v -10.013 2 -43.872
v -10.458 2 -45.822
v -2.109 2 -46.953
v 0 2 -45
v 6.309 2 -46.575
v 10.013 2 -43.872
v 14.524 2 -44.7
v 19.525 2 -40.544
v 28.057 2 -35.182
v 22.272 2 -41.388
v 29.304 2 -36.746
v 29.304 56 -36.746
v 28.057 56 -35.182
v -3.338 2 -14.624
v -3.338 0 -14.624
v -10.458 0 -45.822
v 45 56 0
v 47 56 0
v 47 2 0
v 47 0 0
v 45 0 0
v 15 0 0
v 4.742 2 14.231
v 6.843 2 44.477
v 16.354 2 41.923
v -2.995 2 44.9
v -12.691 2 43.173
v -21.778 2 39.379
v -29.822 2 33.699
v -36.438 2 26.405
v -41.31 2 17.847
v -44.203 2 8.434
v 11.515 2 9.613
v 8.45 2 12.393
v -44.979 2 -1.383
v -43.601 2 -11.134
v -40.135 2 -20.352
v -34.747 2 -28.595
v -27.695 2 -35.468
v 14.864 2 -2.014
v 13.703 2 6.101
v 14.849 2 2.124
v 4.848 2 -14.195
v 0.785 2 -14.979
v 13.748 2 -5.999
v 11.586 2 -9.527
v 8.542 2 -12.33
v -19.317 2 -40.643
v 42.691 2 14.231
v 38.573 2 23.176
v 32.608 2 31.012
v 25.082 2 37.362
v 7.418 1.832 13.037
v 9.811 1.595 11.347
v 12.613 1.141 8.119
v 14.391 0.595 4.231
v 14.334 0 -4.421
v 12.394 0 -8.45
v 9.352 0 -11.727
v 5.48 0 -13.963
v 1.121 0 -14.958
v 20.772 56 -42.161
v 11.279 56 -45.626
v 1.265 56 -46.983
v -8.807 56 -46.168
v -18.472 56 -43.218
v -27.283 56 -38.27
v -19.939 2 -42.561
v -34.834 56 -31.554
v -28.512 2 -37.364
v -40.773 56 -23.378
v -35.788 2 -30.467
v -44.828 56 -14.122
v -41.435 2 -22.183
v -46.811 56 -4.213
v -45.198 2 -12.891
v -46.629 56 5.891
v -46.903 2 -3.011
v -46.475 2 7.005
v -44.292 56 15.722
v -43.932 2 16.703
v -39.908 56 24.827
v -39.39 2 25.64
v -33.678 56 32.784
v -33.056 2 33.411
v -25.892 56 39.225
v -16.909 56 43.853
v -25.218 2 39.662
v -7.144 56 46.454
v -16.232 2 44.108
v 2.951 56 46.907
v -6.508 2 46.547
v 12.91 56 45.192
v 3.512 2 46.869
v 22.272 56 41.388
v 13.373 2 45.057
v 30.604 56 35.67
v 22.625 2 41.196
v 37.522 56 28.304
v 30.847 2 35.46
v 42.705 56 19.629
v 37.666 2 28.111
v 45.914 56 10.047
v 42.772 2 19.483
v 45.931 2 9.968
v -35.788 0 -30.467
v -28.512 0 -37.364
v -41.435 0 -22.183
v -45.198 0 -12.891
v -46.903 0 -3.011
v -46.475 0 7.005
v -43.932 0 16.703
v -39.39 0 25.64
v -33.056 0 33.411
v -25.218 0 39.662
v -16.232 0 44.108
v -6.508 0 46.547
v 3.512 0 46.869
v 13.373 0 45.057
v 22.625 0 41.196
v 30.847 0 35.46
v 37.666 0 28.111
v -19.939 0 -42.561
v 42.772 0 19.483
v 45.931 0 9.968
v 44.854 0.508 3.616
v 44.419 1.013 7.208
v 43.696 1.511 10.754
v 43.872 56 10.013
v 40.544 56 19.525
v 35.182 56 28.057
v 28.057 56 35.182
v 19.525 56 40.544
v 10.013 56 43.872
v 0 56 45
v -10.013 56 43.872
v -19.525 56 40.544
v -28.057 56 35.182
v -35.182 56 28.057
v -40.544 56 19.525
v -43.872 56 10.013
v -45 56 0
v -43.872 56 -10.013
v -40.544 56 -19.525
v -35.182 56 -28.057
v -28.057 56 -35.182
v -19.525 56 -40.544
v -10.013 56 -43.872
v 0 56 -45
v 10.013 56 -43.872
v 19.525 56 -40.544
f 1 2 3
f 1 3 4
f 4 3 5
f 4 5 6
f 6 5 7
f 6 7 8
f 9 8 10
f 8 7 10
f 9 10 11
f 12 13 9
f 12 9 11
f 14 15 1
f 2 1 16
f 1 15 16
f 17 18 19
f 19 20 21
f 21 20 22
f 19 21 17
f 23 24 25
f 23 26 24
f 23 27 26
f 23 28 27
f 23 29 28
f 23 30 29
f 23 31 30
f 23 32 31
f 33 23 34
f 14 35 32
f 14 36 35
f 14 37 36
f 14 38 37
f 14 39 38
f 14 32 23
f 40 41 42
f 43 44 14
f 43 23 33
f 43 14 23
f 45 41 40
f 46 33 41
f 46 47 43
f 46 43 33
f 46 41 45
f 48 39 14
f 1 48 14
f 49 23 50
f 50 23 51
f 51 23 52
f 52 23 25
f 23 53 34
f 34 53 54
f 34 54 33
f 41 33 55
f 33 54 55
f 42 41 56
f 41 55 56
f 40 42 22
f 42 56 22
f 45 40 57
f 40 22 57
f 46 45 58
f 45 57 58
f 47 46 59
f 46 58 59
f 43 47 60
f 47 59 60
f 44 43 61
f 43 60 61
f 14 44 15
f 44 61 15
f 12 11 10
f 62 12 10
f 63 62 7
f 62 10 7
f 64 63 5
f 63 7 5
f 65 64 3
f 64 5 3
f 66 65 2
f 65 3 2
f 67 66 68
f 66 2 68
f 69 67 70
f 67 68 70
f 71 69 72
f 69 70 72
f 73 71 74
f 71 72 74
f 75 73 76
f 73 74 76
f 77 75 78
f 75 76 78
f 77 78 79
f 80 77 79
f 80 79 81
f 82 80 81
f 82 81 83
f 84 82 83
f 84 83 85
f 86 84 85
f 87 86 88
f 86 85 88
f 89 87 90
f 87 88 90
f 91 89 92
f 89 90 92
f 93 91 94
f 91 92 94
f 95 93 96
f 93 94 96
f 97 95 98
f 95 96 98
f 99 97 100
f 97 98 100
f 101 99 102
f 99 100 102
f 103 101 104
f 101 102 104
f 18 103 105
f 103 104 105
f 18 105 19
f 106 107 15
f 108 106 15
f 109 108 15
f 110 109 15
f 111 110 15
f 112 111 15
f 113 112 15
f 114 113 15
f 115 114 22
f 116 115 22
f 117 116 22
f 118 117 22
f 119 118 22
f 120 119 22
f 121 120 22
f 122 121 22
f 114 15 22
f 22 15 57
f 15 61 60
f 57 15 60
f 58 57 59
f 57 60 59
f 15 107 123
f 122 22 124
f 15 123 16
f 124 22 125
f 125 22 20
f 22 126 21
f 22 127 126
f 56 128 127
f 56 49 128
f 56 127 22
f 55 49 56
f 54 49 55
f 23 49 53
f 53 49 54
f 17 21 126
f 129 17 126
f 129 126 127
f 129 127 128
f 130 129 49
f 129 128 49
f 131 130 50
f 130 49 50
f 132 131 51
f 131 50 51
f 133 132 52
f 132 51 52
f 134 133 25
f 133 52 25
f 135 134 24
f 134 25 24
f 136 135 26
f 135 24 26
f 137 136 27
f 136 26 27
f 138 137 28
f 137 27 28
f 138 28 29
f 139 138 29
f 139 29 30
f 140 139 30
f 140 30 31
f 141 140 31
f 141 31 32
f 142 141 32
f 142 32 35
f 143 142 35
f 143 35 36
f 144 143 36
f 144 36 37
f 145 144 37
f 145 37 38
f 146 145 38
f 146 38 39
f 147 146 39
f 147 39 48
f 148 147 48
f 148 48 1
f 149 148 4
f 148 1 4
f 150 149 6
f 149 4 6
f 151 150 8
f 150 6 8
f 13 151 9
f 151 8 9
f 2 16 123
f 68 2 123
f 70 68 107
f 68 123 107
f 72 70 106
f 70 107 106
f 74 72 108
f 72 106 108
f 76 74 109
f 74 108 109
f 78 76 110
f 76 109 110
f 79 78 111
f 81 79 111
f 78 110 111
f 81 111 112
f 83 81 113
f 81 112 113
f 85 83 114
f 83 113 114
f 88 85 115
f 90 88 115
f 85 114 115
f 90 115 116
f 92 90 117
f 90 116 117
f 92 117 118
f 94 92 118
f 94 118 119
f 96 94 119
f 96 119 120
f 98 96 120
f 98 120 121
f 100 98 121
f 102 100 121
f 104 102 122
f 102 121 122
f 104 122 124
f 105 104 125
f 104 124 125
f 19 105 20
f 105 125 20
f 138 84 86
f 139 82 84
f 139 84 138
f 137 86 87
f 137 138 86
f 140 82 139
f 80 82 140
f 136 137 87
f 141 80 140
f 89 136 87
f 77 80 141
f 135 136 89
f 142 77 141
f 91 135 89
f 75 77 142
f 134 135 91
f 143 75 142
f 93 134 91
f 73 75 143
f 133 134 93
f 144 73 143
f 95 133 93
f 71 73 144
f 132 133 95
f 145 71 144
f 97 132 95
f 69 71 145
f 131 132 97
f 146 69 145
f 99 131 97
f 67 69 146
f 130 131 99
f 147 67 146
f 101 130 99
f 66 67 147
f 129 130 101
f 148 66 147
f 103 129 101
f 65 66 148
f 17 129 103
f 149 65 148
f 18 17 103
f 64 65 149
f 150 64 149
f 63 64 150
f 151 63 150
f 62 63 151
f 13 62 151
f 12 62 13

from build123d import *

# Parameters (mm, degrees)
BOSS_EXTRUDE1_DEPTH = 2
BOSS_EXTRUDE2_DEPTH = 54
CHAMFER1_SIZE2      = 14.230739445
CHAMFER1_SIZE       = 2


with BuildPart() as part:
    # Sketch1 → Boss-Extrude1 (new body)
    with BuildSketch(Plane(origin=(0, 0, 0), x_dir=(1, 0, 0), z_dir=(0, 1, 0))):
        with BuildLine():
            Line((-3.337814009, 14.623918683), (-10.458483896, 45.821611873))
            ThreePointArc((-10.458483896, 45.821611873), (-29.304020687, -36.746079676), (47, 0))
            Line((47, 0), (15, 0))
            ThreePointArc((15, 0), (9.352347028, 11.727472237), (-3.337814009, 14.623918683))
        make_face()
    extrude(amount=BOSS_EXTRUDE1_DEPTH)

    # Sketch2 → Boss-Extrude2 (add)
    with BuildSketch(Plane(origin=(0, 2, 0), x_dir=(1, 0, 0), z_dir=(0, 1, 0))):
        with BuildLine():
            Line((28.057041084, 35.182416711), (29.304020687, 36.746079676))
            ThreePointArc((29.304020687, 36.746079676), (-42.345536791, -20.392535739), (47, 0))
            Line((47, 0), (45, 0))
            ThreePointArc((45, 0), (-40.543599056, -19.52476826), (28.057041084, 35.182416711))
        make_face()
    extrude(amount=BOSS_EXTRUDE2_DEPTH)

    # Chamfer1
    chamfer1_edges = [part.edges().sort_by_distance(p)[0] for p in [
        (30, 2, 0),
    ]]
    chamfer1_side = [part.faces().sort_by_distance(p)[0] for p in [
        (30, 1.96, 0),
    ]]
    chamfer(chamfer1_edges, length=CHAMFER1_SIZE - 0.0001, length2=CHAMFER1_SIZE2 - 0.0001, reference=chamfer1_side[0])  # a hair under: the kernel refuses the full size


solid = part.part
